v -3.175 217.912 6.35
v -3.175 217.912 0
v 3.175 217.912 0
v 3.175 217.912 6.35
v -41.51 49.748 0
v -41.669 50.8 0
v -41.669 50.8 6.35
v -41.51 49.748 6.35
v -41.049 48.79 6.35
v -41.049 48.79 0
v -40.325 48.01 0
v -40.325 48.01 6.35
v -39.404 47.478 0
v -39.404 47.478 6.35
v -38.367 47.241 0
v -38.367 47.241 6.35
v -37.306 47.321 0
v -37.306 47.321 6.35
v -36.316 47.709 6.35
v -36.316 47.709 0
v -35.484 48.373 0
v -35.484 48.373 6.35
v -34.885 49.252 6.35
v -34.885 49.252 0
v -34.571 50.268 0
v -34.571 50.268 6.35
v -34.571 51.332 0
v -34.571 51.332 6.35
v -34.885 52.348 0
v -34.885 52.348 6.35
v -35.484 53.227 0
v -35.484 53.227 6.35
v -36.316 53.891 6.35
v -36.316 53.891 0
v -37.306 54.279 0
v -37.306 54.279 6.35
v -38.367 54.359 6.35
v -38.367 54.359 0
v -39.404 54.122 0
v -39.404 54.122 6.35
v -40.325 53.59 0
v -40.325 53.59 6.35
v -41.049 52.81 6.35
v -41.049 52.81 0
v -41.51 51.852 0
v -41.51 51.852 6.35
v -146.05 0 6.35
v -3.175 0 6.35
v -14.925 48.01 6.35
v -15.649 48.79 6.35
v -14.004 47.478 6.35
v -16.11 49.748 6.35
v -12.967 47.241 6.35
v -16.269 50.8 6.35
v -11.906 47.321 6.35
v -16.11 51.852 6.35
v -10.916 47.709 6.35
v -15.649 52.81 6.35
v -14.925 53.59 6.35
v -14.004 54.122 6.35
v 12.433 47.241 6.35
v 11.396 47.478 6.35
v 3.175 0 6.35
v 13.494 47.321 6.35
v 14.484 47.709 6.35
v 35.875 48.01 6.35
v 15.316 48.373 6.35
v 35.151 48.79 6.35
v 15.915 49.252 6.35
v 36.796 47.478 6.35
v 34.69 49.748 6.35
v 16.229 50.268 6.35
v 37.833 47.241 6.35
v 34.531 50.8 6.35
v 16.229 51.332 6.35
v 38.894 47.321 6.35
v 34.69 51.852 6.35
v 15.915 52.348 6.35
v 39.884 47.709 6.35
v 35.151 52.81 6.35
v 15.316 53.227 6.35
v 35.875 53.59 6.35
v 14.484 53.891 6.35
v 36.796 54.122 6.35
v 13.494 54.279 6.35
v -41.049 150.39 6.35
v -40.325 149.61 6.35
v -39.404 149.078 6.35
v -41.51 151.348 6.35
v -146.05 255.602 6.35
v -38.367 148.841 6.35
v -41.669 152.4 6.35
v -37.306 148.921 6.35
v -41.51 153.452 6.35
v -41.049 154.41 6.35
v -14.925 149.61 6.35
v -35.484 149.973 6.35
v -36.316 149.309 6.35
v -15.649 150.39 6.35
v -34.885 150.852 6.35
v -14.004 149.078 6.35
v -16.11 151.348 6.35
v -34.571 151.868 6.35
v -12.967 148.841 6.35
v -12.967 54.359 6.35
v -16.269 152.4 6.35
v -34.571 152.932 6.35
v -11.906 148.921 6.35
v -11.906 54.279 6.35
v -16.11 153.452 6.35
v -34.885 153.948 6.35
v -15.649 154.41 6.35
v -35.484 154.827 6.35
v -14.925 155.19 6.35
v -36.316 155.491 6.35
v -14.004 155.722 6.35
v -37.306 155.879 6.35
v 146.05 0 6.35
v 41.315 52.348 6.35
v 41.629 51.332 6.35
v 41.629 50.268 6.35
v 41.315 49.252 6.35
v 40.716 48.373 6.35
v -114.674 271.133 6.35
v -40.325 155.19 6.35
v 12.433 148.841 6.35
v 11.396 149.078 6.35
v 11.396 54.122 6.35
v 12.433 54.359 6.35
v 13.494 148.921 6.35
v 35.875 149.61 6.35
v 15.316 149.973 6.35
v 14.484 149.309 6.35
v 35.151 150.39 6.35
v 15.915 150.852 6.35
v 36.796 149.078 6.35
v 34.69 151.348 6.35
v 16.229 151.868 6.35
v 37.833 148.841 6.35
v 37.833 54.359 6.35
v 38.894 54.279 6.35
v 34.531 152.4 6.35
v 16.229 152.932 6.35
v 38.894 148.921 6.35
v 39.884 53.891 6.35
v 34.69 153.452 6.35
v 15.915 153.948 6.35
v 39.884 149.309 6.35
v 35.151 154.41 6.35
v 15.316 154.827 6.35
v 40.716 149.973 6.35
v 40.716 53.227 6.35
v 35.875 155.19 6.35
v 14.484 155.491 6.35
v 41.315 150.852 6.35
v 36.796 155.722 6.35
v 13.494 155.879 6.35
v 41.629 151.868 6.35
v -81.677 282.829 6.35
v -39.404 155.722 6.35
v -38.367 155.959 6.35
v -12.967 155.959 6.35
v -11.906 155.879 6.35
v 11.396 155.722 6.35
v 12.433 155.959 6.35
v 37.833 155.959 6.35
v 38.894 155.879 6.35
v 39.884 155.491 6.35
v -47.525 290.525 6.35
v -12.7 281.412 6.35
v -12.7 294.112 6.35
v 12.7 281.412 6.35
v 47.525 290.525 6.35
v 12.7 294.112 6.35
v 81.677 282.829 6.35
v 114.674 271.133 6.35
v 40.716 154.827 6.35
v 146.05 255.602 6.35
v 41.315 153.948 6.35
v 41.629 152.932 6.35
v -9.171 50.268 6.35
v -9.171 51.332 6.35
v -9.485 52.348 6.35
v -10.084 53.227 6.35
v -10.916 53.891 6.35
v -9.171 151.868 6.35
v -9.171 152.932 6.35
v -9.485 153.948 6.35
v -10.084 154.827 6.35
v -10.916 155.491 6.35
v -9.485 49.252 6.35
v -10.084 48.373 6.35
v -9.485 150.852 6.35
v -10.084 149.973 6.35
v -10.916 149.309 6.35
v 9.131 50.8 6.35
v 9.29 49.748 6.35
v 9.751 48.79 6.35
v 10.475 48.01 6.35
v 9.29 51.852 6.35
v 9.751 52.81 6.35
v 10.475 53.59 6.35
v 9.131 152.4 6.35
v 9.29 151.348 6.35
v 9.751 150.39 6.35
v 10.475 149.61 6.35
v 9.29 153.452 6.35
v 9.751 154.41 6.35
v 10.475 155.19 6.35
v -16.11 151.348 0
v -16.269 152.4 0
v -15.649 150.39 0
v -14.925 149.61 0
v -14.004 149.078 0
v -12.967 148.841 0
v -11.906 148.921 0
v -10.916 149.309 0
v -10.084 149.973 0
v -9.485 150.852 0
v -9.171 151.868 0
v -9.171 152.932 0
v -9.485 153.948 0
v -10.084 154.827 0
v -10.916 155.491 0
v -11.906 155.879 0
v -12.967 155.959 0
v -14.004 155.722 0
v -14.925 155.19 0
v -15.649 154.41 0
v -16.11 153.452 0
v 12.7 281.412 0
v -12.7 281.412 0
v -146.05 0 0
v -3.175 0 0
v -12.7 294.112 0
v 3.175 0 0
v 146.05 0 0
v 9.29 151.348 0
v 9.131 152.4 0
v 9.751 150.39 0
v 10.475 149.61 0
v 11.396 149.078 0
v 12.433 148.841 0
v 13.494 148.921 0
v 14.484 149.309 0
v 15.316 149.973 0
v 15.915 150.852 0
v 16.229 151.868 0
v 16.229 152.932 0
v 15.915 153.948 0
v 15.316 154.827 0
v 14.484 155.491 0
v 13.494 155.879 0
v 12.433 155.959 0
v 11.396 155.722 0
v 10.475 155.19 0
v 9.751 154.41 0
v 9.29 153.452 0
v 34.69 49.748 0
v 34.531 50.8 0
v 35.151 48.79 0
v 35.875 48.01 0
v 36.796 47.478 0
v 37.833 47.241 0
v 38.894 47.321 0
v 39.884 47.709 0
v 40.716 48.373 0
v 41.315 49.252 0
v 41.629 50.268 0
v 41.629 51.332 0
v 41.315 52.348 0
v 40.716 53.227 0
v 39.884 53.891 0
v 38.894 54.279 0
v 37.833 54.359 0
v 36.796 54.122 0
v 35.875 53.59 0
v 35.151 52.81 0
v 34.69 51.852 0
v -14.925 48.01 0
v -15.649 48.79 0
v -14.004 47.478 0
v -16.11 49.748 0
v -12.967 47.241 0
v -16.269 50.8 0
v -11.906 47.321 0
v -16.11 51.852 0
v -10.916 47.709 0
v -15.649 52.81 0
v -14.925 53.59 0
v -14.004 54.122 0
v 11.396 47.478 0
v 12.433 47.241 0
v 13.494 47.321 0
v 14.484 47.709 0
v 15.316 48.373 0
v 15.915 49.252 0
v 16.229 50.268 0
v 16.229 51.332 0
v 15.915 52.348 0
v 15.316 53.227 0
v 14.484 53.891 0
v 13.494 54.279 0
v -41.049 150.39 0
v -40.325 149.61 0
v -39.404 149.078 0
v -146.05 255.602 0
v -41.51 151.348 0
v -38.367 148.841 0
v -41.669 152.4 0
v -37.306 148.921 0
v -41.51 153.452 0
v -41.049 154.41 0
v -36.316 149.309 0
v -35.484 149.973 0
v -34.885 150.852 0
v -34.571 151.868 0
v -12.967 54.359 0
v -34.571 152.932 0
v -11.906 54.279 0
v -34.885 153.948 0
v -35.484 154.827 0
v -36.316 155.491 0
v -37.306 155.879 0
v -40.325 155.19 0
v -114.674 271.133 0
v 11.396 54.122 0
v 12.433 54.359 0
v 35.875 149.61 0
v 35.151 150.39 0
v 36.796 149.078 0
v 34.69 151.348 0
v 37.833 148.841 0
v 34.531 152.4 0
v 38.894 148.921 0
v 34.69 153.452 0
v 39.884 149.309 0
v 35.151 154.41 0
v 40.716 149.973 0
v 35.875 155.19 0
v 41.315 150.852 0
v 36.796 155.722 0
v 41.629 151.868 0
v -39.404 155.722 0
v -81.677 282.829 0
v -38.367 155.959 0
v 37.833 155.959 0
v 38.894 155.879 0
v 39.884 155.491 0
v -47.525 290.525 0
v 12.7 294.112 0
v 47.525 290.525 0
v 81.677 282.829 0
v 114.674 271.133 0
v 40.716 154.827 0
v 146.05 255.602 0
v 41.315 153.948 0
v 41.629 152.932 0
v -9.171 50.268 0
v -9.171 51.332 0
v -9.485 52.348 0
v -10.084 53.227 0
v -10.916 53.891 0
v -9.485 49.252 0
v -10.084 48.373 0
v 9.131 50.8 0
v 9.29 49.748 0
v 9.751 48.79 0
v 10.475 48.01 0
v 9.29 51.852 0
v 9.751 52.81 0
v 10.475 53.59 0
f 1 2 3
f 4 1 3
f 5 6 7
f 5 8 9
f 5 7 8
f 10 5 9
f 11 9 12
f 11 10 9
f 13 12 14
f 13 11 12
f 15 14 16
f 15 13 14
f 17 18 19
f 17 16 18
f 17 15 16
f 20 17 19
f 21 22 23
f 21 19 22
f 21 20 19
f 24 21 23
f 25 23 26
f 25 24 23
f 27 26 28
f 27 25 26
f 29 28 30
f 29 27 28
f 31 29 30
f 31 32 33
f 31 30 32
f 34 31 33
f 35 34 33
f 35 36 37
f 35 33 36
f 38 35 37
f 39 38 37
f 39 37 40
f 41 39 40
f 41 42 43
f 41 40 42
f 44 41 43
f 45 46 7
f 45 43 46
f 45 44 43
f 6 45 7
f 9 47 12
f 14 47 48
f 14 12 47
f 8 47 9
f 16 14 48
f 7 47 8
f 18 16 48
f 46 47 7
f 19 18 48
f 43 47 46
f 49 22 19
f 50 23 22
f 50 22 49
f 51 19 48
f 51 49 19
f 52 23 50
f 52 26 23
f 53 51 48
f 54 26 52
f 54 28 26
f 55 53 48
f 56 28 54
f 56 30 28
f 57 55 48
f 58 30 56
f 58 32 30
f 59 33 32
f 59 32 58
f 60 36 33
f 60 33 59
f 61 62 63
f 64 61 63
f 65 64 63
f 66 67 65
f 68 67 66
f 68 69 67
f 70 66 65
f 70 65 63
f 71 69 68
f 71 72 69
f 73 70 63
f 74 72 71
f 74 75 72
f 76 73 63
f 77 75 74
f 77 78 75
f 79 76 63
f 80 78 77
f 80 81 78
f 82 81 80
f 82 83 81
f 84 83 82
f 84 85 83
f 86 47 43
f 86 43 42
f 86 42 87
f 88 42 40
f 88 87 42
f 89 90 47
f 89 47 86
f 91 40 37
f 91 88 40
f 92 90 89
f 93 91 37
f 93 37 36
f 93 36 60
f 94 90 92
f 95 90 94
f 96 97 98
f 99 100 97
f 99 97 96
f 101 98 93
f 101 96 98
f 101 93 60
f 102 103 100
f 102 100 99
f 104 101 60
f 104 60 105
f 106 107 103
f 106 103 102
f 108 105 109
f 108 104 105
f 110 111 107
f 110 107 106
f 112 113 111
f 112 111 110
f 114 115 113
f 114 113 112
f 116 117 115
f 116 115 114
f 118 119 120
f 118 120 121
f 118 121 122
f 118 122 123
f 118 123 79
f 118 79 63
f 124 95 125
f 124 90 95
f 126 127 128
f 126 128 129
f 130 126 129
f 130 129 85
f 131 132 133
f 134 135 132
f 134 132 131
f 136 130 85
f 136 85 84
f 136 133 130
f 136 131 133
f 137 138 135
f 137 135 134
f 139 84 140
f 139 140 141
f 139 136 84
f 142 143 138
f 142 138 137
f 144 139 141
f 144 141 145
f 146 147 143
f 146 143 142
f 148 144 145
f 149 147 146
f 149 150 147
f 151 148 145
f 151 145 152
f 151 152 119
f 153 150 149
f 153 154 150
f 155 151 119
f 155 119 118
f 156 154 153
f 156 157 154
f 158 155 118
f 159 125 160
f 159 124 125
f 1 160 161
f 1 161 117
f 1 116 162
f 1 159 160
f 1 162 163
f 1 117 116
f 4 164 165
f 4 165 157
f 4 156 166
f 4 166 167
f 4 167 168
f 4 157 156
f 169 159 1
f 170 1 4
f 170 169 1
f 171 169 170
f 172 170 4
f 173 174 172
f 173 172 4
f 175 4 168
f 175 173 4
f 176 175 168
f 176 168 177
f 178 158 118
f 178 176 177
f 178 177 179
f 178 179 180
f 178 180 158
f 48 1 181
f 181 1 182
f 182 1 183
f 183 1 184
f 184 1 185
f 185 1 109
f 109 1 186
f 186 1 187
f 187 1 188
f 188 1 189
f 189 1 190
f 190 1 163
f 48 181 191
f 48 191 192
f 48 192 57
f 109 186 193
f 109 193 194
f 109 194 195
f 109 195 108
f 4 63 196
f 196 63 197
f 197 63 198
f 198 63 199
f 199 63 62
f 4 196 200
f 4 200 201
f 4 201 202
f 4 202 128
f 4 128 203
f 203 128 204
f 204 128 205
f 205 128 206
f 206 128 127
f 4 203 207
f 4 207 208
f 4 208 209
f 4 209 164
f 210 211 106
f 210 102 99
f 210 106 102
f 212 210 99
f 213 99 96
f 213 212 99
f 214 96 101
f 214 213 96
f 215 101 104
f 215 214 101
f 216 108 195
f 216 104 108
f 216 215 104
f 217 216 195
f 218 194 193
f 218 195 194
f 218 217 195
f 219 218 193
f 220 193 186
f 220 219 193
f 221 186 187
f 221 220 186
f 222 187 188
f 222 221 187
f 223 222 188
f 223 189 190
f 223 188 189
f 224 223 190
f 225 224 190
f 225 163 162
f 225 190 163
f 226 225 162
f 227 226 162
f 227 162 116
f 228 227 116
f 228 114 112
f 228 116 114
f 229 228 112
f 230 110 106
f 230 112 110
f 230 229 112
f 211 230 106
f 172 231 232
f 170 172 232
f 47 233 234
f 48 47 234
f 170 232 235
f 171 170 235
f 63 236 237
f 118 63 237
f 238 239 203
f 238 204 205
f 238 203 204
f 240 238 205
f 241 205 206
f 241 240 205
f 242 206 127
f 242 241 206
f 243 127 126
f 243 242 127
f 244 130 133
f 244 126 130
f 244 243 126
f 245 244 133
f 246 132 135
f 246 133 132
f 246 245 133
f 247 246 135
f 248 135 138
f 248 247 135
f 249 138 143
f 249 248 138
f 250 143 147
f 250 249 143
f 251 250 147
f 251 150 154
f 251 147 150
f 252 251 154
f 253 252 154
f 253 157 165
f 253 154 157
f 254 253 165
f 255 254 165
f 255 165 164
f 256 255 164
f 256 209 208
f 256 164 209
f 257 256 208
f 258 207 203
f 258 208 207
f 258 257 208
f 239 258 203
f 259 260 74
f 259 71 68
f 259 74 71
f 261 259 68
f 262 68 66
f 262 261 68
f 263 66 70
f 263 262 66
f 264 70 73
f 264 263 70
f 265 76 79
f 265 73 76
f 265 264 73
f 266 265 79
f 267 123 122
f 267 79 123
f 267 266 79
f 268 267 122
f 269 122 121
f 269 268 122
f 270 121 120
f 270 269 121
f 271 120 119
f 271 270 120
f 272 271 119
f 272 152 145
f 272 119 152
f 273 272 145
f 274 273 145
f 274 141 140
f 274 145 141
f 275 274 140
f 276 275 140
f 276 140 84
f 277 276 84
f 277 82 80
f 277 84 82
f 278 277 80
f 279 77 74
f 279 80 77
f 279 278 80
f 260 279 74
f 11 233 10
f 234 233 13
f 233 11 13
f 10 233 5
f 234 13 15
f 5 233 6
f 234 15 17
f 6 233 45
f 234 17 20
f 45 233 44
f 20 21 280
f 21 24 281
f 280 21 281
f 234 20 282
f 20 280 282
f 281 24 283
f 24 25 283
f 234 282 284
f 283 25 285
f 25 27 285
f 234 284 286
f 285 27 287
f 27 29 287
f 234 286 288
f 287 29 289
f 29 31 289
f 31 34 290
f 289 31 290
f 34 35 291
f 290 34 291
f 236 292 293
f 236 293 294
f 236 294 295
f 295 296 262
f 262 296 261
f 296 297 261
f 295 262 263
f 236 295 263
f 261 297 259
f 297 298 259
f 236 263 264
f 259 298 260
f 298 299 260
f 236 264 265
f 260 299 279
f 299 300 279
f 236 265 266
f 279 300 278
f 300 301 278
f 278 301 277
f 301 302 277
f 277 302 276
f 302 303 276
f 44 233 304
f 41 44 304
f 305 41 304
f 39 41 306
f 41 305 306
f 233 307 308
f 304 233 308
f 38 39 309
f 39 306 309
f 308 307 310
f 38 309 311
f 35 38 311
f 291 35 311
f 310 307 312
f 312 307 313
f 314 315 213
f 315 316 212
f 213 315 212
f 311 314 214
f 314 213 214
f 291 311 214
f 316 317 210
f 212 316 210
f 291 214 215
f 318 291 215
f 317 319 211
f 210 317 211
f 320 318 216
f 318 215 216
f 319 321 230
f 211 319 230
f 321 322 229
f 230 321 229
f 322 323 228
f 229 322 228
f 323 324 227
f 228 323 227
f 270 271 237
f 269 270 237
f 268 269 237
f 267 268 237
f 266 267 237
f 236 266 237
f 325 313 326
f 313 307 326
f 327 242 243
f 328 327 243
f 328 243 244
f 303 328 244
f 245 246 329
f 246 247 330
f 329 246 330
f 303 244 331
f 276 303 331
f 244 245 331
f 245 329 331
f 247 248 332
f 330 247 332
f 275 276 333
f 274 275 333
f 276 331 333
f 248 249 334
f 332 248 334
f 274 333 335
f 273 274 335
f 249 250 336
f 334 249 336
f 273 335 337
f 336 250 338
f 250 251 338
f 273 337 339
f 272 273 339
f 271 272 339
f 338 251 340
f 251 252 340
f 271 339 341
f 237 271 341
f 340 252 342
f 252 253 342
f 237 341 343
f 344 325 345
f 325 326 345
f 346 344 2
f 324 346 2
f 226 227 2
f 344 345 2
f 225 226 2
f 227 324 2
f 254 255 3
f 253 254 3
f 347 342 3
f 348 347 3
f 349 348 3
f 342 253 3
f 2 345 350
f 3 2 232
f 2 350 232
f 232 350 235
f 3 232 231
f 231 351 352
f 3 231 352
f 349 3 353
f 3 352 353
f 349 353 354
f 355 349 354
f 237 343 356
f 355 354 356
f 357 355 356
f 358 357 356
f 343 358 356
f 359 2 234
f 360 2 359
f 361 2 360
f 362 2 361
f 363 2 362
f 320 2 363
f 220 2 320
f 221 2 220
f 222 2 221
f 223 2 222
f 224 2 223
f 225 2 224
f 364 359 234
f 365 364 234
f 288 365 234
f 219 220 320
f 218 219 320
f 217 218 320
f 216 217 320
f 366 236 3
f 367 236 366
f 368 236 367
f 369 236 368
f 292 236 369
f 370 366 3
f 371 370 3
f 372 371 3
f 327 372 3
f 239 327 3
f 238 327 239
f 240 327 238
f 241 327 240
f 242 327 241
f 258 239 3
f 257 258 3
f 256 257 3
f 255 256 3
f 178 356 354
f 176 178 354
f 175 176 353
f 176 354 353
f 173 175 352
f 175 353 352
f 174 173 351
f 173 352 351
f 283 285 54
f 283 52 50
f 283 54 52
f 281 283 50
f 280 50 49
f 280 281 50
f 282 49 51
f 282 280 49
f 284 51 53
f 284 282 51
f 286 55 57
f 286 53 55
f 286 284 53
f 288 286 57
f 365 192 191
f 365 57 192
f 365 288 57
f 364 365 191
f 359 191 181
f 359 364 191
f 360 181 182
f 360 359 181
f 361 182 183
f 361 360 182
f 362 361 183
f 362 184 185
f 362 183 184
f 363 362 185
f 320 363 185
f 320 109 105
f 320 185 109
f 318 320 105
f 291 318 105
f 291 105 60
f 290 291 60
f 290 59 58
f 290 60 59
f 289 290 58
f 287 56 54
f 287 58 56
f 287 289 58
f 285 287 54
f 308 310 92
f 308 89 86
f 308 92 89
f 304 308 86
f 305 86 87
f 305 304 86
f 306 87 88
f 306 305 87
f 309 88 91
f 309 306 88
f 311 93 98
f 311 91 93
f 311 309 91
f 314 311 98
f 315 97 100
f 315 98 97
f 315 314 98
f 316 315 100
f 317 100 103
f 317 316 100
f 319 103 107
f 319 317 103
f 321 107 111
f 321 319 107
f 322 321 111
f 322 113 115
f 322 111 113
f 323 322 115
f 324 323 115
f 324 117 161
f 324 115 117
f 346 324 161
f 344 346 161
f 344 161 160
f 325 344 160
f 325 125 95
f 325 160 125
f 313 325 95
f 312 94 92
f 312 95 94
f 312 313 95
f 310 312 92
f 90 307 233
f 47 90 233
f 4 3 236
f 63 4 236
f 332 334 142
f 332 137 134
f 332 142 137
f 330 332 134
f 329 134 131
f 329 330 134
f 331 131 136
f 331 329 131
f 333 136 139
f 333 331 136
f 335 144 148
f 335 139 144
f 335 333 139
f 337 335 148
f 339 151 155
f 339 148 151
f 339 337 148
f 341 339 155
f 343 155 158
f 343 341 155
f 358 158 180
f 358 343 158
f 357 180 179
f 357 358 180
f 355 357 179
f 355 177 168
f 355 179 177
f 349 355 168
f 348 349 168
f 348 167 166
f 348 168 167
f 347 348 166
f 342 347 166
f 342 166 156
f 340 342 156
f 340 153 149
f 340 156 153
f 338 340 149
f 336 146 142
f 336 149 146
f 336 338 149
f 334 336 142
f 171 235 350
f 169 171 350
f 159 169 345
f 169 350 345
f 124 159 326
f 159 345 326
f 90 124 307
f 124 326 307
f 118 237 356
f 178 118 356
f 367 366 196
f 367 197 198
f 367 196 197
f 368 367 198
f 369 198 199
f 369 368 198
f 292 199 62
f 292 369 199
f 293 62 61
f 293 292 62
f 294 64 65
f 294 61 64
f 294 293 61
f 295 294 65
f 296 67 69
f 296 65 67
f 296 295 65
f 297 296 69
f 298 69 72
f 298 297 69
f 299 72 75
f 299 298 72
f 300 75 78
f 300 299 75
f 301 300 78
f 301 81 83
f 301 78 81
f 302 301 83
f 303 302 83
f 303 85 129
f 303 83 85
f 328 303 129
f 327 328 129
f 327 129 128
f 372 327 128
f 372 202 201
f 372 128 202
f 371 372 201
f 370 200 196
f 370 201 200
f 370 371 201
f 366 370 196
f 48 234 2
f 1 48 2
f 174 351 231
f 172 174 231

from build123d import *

# Parameters (mm, degrees)
BOSS_EXTRUDE2_DEPTH     = 6.35
CUT_EXTRUDE3_DEPTH      = 148.336
CUT_EXTRUDE3_DEPTH_BACK = 93.472
SKETCH3_R               = 3.5687


with BuildPart() as part:
    # Sketch2 → Boss-Extrude2 (new body)
    with BuildSketch(Plane.XY):
        with BuildLine():
            Line((-3.175, 0), (-3.175, 217.911929367))
            Line((-3.175, 217.911929367), (3.175, 217.911929367))
            Line((3.175, 217.911929367), (3.175, 0))
            Line((3.175, 0), (146.05, 0))
            Line((146.05, 0), (146.05, 255.602258394))
            ThreePointArc((146.05, 255.602258394), (81.677042764, 282.828530529), (12.7, 294.111929367))
            Line((12.7, 294.111929367), (12.7, 281.411929367))
            Line((12.7, 281.411929367), (-12.7, 281.411929367))
            Line((-12.7, 281.411929367), (-12.7, 294.111929367))
            ThreePointArc((-12.7, 294.111929367), (-81.677042764, 282.828530529), (-146.05, 255.602258394))
            Line((-146.05, 255.602258394), (-146.05, 0))
            Line((-146.05, 0), (-3.175, 0))
        make_face()
    extrude(amount=BOSS_EXTRUDE2_DEPTH)

    # Sketch3 → Cut-Extrude3 (cut, two sides: drawn at the far end of the back side and taken through both)
    with BuildSketch(Plane.XY.offset(-CUT_EXTRUDE3_DEPTH_BACK)):
        with Locations(Location((12.7, 50.8, 0), (0, 0, 180))):
            Circle(SKETCH3_R)
        with Locations(Location((38.1, 50.8, 0), (0, 0, 180))):
            Circle(SKETCH3_R)
        with Locations(Location((12.7, 152.4, 0), (0, 0, 180))):
            Circle(SKETCH3_R)
        with Locations(Location((38.1, 152.4, 0), (0, 0, 180))):
            Circle(SKETCH3_R)
        with Locations(Location((-12.7, 50.8, 0), (0, 0, 180))):
            Circle(SKETCH3_R)
        with Locations(Location((-38.1, 50.8, 0), (0, 0, 180))):
            Circle(SKETCH3_R)
        with Locations(Location((-38.1, 152.4, 0), (0, 0, 180))):
            Circle(SKETCH3_R)
        with Locations(Location((-12.7, 152.4, 0), (0, 0, 180))):
            Circle(SKETCH3_R)
    extrude(amount=CUT_EXTRUDE3_DEPTH + CUT_EXTRUDE3_DEPTH_BACK, mode=Mode.SUBTRACT)


solid = part.part
